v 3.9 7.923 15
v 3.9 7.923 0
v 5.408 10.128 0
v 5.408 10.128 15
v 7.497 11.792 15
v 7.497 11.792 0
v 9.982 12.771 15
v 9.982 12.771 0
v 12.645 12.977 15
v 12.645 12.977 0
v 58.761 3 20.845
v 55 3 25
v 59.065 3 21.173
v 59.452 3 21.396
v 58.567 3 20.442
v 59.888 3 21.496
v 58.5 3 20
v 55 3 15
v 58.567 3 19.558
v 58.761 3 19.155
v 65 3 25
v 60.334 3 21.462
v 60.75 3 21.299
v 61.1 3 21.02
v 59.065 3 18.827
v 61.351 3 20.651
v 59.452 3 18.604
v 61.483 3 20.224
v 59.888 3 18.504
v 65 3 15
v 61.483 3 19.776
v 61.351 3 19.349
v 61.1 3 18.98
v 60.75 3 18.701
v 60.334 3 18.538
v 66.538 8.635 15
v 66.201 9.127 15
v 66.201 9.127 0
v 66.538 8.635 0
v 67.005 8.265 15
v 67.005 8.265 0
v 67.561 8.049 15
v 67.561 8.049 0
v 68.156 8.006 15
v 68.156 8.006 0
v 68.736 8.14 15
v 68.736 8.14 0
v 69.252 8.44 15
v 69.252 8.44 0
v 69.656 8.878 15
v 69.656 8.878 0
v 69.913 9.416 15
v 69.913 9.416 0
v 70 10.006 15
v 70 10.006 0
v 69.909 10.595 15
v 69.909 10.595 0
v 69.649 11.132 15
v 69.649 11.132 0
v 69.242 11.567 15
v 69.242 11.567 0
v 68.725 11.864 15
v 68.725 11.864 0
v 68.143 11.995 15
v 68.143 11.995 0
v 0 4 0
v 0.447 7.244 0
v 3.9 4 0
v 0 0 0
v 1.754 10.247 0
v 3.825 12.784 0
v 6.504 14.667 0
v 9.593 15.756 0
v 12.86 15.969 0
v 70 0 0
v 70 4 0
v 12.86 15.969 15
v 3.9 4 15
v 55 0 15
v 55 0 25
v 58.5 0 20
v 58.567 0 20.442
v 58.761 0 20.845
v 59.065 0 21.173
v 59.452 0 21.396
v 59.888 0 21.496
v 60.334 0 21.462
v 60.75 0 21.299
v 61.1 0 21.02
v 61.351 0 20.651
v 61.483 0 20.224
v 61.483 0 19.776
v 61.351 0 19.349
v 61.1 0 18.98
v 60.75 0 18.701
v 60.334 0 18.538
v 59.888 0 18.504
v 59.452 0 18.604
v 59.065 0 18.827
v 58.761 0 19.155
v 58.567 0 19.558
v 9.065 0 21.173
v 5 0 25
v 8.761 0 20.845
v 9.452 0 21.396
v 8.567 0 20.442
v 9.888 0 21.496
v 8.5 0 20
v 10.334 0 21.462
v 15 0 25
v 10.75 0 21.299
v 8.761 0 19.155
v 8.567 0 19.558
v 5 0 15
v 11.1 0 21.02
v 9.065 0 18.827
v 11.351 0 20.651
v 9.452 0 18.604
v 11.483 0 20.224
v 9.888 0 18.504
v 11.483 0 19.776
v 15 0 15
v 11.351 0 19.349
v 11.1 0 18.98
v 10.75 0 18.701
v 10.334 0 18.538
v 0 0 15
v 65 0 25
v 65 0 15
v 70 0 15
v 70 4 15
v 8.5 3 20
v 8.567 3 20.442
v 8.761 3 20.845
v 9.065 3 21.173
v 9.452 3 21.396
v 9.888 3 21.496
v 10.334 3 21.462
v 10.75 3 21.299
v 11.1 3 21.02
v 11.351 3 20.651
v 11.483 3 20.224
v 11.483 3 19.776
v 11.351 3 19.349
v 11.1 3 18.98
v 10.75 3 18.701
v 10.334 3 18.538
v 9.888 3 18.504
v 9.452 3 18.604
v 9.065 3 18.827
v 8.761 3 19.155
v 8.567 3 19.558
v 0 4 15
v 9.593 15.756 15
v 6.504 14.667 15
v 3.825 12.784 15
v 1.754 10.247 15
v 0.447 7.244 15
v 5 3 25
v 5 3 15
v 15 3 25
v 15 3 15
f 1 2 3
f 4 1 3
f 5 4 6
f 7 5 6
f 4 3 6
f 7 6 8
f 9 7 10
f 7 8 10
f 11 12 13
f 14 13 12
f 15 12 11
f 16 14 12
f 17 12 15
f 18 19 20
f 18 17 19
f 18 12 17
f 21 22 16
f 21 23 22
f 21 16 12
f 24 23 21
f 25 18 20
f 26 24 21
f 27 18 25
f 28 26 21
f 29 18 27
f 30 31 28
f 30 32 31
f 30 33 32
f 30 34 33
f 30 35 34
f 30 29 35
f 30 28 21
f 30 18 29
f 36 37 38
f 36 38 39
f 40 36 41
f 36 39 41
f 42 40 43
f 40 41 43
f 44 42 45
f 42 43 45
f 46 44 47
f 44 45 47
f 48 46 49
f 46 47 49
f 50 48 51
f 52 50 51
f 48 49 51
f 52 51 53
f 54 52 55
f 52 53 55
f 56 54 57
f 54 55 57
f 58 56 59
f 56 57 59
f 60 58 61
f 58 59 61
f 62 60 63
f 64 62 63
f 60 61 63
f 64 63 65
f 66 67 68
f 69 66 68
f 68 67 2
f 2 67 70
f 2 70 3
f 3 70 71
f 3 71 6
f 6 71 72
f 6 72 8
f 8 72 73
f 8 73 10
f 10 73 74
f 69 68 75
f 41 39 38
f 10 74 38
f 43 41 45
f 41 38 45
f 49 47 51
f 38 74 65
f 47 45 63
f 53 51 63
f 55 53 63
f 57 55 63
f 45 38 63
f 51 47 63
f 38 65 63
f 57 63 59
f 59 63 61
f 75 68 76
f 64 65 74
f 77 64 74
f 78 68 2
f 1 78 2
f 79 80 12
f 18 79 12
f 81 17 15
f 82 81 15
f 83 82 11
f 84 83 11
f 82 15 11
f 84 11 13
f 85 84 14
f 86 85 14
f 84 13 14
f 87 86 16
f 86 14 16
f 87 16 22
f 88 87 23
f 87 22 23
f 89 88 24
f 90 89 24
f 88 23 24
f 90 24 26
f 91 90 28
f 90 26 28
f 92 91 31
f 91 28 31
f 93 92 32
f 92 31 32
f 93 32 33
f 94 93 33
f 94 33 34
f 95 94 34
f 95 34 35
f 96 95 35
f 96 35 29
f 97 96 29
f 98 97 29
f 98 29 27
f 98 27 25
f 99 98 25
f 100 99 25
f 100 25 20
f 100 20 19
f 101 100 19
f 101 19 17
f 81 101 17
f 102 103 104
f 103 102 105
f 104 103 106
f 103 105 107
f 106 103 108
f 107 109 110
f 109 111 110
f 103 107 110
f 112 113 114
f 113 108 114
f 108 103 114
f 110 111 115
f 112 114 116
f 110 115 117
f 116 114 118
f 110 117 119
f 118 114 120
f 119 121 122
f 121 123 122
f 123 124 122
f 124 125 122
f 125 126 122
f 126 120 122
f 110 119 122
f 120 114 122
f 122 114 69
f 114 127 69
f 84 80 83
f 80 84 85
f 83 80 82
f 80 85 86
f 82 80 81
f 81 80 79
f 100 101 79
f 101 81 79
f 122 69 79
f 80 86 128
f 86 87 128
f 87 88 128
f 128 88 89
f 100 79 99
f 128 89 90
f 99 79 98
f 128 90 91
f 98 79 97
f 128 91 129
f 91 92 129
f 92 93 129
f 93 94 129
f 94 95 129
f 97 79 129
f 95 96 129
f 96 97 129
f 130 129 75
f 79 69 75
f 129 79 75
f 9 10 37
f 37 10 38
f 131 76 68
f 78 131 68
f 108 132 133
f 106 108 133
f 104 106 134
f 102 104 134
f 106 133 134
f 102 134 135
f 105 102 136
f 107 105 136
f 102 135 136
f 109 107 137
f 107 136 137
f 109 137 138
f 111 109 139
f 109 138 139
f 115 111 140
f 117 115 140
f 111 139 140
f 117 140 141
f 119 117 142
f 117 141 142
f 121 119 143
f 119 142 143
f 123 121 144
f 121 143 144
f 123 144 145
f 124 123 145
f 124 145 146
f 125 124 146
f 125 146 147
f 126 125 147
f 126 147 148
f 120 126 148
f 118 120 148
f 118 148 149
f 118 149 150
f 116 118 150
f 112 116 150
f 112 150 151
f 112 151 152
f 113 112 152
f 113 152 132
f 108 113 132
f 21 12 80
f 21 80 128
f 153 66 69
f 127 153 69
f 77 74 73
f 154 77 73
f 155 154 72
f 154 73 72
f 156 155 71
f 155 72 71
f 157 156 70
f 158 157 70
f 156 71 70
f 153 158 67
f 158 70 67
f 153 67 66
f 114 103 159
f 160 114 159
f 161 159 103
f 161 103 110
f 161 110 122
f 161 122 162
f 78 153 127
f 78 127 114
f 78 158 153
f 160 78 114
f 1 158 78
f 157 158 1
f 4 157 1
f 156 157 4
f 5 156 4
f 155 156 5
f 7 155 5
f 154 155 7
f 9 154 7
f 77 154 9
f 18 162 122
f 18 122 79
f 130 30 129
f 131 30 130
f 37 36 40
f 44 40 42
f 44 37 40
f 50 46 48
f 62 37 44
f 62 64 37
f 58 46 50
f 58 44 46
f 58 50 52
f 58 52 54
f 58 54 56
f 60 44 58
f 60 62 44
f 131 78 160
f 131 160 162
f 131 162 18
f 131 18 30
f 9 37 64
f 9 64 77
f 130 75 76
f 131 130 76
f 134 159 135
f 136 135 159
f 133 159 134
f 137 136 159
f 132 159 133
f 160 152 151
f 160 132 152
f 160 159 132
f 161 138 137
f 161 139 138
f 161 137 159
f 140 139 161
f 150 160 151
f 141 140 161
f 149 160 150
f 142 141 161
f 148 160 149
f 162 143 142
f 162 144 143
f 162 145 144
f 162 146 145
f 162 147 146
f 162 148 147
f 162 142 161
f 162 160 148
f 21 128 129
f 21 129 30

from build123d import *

# Parameters (mm, degrees)
F1_DEPTH = 15
F0_W     = 10
F0_H     = 3
F2_DEPTH = 25
F4_R     = 1.5
F3_R     = 1.5
F5_DEPTH = 5


with BuildPart() as f1:
    # F0 (on Top) → F1 (new body)
    with BuildSketch(Plane.XY):
        with BuildLine():
            Line((0, 4), (0, 0))
            Line((0, 0), (5, 0))
            Line((5, 0), (5, 3))
            Line((5, 3), (15, 3))
            Line((15, 3), (15, 0))
            Line((15, 0), (55, 0))
            Line((55, 0), (55, 3))
            Line((55, 3), (65, 3))
            Line((65, 3), (65, 0))
            Line((65, 0), (70, 0))
            Line((70, 0), (70, 4))
            Line((70, 4), (3.9, 4))
            Line((3.9, 4), (3.9, 7.923009))
            ThreePointArc((3.9, 7.923009), (7.496859, 11.792414), (12.645339, 12.976833))
            Line((12.645339, 12.976833), (66.200703, 9.12677))
            ThreePointArc((66.200703, 9.12677), (69.655888, 8.878378), (68.143409, 11.994852))
            Line((68.143409, 11.994852), (12.860452, 15.969111))
            ThreePointArc((12.860452, 15.969111), (3.824593, 12.784231), (0, 4))
        make_face()
    extrude(amount=F1_DEPTH)

    # F0 (on Top) → F2 (join)
    with BuildSketch(Plane.XY):
        with Locations((10, 1.5)):
            Rectangle(F0_W, F0_H)
        with Locations((60, 1.5)):
            Rectangle(F0_W, F0_H)
    extrude(amount=F2_DEPTH)

    # F4 (on face) + F3 (on face) → F5 (cut)
    with BuildSketch(Plane(origin=(0, 3, 0), x_dir=(-1, 0, 0), z_dir=(0, 1, 0))):
        with Locations((-60, 20)):
            Circle(F4_R)
    with BuildSketch(Plane(origin=(0, 3, 0), x_dir=(-1, 0, 0), z_dir=(0, 1, 0))):
        with Locations((-10, 20)):
            Circle(F3_R)
    extrude(amount=-F5_DEPTH, mode=Mode.SUBTRACT)


solid = f1.part
